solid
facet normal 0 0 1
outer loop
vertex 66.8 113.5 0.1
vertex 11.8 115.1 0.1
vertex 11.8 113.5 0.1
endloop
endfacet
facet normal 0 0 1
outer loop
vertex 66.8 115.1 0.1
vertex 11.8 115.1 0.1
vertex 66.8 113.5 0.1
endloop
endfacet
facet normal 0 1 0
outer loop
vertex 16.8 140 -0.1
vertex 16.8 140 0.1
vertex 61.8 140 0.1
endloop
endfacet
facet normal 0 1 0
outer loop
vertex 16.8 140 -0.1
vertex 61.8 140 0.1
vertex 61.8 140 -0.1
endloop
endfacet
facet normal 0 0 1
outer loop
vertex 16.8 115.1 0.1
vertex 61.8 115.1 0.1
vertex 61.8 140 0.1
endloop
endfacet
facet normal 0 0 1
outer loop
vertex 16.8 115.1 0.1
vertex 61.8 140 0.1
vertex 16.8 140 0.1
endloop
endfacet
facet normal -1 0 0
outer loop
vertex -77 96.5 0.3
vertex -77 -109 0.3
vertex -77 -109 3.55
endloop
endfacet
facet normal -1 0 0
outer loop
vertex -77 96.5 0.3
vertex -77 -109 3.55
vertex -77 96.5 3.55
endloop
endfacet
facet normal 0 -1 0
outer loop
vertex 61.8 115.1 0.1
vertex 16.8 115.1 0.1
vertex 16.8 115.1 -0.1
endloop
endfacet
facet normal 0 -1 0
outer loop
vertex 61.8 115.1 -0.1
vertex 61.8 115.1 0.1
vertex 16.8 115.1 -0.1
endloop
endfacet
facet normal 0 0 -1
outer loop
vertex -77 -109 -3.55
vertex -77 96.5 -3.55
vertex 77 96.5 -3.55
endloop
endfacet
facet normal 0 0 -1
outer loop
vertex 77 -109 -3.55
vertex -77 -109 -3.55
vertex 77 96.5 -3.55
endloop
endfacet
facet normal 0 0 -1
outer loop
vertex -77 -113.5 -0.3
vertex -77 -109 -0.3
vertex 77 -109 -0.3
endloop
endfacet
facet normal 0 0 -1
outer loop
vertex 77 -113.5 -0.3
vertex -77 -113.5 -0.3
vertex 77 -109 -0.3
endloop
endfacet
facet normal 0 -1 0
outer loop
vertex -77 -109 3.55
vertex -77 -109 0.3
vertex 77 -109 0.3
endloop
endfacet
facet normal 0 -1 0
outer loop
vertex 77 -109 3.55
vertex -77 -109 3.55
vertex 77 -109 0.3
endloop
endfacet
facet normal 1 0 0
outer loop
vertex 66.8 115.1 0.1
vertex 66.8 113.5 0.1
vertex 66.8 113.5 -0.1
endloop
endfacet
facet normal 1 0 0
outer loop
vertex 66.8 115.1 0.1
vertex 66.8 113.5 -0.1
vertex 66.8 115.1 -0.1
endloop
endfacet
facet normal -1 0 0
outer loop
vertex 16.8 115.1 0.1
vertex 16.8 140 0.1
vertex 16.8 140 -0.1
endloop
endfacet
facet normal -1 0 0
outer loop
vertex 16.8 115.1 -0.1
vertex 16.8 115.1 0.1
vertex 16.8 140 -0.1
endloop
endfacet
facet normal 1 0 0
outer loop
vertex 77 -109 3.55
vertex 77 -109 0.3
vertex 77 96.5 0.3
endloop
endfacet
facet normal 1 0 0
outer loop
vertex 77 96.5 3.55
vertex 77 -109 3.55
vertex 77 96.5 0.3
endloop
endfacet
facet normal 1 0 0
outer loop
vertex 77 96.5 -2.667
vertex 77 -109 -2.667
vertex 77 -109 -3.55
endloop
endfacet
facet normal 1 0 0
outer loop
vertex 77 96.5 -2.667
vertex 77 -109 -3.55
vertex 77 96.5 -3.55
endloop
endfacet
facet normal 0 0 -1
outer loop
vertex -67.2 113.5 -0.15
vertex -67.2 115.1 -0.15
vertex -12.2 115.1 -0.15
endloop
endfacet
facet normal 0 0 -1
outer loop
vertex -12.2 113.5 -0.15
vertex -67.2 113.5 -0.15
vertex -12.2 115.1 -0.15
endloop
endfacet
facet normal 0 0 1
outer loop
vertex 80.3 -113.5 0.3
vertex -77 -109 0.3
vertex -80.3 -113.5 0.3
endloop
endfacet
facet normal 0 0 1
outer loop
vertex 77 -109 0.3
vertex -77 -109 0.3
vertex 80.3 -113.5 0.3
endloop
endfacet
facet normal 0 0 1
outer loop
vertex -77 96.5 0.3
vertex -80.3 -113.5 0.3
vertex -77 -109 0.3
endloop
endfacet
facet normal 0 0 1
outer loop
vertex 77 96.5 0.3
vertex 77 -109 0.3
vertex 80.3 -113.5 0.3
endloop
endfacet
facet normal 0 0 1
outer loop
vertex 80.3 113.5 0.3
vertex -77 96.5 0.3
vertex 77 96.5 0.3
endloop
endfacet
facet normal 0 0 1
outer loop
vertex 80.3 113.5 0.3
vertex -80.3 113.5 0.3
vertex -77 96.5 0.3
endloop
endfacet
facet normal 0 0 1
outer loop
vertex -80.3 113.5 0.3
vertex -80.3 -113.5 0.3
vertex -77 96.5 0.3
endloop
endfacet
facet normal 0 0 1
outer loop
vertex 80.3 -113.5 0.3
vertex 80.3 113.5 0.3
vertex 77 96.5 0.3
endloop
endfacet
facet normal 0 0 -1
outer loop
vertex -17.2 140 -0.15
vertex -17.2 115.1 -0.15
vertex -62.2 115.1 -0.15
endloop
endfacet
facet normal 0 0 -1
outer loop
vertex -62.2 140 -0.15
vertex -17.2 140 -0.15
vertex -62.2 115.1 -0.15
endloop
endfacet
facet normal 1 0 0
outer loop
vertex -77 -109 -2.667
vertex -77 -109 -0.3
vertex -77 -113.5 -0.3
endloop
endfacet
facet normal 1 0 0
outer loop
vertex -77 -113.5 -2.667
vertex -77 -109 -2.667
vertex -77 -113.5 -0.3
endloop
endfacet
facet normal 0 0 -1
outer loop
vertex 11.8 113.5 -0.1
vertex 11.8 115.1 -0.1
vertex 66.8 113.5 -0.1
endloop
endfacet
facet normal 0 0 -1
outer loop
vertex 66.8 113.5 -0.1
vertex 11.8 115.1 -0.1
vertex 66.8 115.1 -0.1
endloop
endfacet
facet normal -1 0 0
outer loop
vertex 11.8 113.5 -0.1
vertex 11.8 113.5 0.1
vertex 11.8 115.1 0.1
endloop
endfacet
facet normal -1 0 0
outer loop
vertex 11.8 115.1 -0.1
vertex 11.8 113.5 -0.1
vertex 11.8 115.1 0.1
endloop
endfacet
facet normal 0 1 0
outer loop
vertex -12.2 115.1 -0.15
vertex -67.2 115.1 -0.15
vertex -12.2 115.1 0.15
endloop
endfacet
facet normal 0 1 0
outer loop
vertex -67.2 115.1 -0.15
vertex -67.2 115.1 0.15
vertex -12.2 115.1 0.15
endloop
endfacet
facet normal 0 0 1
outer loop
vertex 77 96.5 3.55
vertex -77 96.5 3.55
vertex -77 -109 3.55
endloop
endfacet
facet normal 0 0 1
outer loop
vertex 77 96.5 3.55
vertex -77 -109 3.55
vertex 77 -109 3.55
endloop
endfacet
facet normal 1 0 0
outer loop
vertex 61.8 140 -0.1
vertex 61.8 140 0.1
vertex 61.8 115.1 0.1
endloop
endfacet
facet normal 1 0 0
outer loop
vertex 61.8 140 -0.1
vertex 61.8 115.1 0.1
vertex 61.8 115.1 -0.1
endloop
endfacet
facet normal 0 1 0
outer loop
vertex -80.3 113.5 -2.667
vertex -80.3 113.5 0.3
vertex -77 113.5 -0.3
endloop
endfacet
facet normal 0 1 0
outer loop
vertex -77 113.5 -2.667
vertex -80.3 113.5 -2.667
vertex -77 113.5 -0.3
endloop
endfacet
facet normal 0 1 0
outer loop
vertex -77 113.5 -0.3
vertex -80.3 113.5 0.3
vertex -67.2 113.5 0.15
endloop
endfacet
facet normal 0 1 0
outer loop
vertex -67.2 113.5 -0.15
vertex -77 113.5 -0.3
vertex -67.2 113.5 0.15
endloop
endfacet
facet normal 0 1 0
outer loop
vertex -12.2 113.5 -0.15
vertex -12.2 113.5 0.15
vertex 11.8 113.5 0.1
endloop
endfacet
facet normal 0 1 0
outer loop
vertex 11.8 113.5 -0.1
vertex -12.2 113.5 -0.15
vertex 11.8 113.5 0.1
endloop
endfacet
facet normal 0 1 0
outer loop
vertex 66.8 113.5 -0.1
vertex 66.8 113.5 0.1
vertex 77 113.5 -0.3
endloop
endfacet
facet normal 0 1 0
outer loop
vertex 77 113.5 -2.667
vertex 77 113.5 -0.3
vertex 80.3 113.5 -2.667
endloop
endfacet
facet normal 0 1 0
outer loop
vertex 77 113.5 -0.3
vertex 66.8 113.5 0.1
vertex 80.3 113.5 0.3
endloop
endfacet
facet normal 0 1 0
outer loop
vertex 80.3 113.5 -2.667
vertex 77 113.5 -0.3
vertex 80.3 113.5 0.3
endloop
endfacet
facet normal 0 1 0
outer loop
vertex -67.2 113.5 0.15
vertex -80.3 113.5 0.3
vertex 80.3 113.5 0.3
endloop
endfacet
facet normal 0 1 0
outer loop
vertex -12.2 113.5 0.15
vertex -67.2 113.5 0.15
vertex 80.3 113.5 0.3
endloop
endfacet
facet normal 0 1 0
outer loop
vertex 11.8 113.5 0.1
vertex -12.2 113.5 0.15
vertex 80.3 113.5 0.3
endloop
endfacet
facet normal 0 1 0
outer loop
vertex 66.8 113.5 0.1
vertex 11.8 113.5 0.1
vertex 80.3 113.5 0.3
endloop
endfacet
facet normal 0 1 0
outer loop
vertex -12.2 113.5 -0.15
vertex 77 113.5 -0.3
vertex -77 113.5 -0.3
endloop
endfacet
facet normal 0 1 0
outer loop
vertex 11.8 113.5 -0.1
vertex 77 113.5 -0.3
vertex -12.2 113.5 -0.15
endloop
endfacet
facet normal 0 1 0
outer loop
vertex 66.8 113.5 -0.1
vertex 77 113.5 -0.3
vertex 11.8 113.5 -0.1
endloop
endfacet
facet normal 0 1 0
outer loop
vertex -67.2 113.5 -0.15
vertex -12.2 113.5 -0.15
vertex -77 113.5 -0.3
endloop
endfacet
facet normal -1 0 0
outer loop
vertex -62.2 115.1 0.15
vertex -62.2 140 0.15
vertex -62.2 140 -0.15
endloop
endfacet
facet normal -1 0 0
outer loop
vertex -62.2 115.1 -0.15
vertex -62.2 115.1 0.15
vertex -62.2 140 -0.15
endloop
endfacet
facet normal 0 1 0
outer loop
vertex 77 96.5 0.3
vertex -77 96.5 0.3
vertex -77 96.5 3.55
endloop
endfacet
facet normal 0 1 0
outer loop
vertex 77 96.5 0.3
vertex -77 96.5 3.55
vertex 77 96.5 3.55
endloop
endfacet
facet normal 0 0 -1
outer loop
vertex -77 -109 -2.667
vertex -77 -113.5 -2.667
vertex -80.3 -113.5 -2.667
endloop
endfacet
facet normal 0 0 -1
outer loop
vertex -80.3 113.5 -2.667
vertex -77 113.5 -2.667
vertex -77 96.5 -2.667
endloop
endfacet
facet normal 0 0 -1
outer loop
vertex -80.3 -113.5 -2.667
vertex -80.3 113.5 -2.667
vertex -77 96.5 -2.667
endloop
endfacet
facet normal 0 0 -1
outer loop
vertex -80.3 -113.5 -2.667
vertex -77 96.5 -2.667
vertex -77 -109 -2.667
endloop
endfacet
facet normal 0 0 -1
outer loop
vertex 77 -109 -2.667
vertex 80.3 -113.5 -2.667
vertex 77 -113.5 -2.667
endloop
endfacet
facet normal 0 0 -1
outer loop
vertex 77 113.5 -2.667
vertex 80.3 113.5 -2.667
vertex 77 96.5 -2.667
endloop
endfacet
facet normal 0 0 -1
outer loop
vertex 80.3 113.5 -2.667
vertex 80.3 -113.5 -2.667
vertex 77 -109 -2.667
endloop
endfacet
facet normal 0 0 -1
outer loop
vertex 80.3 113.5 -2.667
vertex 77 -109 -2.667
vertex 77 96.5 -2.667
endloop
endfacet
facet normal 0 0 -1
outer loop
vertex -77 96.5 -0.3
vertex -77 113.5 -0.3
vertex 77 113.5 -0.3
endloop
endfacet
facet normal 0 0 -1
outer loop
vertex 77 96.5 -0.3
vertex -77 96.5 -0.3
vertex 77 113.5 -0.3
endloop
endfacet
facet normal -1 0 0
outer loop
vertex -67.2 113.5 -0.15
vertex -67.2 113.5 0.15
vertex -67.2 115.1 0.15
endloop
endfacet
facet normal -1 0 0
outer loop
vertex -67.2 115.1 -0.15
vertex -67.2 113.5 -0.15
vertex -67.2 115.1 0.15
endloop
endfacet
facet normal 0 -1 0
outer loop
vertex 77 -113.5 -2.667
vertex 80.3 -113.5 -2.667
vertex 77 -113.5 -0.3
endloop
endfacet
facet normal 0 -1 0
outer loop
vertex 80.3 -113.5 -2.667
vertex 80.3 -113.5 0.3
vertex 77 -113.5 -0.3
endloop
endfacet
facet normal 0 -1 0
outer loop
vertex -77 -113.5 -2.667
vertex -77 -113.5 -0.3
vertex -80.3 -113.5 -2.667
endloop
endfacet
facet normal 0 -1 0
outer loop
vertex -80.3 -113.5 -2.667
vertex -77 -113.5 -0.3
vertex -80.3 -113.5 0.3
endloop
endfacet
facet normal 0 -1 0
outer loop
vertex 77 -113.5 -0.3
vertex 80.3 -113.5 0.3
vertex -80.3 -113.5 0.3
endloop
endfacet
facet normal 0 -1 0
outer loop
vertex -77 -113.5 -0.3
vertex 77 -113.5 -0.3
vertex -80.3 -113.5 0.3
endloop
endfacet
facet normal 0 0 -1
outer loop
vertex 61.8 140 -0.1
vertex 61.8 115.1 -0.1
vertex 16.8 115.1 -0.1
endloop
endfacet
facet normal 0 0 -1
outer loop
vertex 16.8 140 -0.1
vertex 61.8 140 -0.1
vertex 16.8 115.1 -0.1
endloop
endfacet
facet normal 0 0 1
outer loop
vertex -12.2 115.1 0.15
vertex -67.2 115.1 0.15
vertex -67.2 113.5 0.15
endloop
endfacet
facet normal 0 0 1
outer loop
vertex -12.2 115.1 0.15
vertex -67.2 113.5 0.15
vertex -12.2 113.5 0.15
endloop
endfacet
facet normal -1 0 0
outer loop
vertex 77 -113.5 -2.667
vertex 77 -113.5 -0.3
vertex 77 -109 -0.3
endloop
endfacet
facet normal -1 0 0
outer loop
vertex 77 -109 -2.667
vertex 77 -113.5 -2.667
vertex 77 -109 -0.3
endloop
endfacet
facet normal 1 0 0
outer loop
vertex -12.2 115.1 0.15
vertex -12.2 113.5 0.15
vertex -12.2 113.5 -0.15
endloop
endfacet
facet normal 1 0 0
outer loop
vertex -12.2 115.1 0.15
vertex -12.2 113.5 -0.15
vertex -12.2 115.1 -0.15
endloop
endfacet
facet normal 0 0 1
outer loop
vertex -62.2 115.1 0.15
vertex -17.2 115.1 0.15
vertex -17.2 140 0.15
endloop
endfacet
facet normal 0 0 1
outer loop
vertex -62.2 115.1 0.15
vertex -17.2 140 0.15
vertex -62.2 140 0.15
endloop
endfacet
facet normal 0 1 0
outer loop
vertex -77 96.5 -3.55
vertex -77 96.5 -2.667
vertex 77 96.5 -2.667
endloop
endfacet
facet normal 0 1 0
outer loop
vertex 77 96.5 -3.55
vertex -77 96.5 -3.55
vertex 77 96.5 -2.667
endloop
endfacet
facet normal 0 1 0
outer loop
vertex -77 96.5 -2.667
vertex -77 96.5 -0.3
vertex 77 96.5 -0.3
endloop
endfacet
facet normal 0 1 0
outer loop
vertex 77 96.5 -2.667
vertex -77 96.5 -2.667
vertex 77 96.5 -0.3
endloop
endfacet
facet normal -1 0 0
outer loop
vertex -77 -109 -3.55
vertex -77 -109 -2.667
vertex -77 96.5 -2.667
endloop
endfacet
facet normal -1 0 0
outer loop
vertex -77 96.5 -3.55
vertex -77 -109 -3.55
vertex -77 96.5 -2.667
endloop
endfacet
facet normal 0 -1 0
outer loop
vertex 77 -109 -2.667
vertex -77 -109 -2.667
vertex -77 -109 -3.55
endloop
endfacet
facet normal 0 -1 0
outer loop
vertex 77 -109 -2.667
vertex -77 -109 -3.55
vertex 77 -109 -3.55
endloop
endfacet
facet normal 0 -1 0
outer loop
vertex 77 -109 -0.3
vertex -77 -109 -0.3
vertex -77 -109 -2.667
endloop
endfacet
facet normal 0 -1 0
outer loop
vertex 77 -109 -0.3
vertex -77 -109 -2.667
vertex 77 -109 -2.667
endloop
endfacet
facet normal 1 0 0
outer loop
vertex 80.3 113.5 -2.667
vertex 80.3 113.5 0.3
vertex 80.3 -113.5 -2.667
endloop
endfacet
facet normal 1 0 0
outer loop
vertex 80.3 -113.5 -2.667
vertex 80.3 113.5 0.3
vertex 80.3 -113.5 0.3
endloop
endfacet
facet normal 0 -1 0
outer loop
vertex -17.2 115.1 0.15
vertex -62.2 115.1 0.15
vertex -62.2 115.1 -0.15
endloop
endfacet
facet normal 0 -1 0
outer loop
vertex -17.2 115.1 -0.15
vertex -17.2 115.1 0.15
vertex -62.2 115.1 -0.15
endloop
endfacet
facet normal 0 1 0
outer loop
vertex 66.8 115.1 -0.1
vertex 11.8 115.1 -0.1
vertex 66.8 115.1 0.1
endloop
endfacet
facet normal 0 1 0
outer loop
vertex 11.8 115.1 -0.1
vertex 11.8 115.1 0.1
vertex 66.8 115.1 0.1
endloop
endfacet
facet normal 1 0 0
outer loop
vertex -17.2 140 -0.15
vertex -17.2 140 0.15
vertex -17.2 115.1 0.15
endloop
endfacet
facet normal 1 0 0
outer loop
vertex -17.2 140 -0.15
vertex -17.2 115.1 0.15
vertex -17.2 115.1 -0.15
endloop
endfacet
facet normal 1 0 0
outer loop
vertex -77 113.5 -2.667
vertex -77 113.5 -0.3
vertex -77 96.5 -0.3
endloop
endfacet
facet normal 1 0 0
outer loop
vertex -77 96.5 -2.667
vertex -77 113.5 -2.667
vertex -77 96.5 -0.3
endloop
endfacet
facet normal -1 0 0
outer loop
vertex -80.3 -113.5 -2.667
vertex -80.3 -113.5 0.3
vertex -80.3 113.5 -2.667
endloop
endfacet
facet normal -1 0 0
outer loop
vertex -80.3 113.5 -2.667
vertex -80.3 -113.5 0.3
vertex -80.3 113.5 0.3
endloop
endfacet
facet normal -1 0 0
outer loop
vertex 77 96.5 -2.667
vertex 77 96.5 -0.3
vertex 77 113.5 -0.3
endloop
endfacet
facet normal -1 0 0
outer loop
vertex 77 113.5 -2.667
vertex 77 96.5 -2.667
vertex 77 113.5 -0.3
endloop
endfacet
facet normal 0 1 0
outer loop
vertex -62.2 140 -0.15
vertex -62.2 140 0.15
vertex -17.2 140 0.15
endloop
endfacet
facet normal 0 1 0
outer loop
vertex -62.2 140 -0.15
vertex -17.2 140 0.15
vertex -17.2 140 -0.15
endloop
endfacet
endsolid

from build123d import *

# Parameters (mm, degrees)
SKETCH1_W                    = 160.6
SKETCH1_H                    = 227
INSULATION_DEPTH             = 0.3
INSULATION_DEPTH_BACK        = 0.3
SKETCH2_W                    = 154
SKETCH2_H                    = 205.5
MAIN_BODY_DEPTH              = 3.55
MAIN_BODY_DEPTH_BACK         = 3.55
SIDE_FOLDS_DEPTH             = 2.366666667
SKETCH6_W                    = 55
SKETCH6_H                    = 18.6
NEGATIVE_TAB_BASE_DEPTH      = 0.1
NEGATIVE_TAB_BASE_DEPTH_BACK = 0.1
SKETCH7_W                    = 55
SKETCH7_H                    = 18.6
POSITIVE_TAB_BASE_DEPTH      = 0.15
POSITIVE_TAB_BASE_DEPTH_BACK = 0.15
SKETCH113_W                  = 0.2
SKETCH113_H                  = 45
NEGATIVE_TAB_DEPTH           = 24.9
SKETCH110_W                  = 0.3
SKETCH110_H                  = 45
POSITIVE_TAB_DEPTH           = 24.9


with BuildPart() as part:
    # Sketch1 → Insulation (new, two sides)
    with BuildSketch(Plane.XY) as insulation_sk:
        Rectangle(SKETCH1_W, SKETCH1_H)
    extrude(amount=INSULATION_DEPTH)
    extrude(insulation_sk.sketch, amount=-INSULATION_DEPTH_BACK)

    # Sketch2 → Main Body (add, two sides)
    with BuildSketch(Plane.XY) as main_body_sk:
        with Locations((0, -6.25)):
            Rectangle(SKETCH2_W, SKETCH2_H)
    extrude(amount=MAIN_BODY_DEPTH)
    extrude(main_body_sk.sketch, amount=-MAIN_BODY_DEPTH_BACK)

    # Sketch5 → Side Folds (add)
    with BuildSketch(Plane(origin=(0, 0, -0.3), x_dir=(-1, 0, 0), z_dir=(0, 0, -1))):
        Polygon((-77, -109), (-77, 96.5), (-77, 113.5), (-80.3, 113.5), (-80.3, -113.5), (-77, -113.5), align=None)
        Polygon((77, 113.5), (77, 96.5), (77, -109), (77, -113.5), (80.3, -113.5), (80.3, 113.5), align=None)
    extrude(amount=SIDE_FOLDS_DEPTH)

    # Sketch6 → Negative Tab Base (add, two sides)
    with BuildSketch(Plane.XY) as negative_tab_base_sk:
        with Locations((39.3, 105.8)):
            Rectangle(SKETCH6_W, SKETCH6_H)
    extrude(amount=NEGATIVE_TAB_BASE_DEPTH)
    extrude(negative_tab_base_sk.sketch, amount=-NEGATIVE_TAB_BASE_DEPTH_BACK)

    # Sketch7 → Positive Tab Base (add, two sides)
    with BuildSketch(Plane.XY) as positive_tab_base_sk:
        with Locations((-39.7, 105.8)):
            Rectangle(SKETCH7_W, SKETCH7_H)
    extrude(amount=POSITIVE_TAB_BASE_DEPTH)
    extrude(positive_tab_base_sk.sketch, amount=-POSITIVE_TAB_BASE_DEPTH_BACK)


with BuildPart() as body_2:
    # Sketch113 → Negative Tab (new body)
    with BuildSketch(Plane(origin=(39.3, 115.1, 0), x_dir=(0, 0, -1), z_dir=(0, 1, 0))):
        Rectangle(SKETCH113_W, SKETCH113_H)
    extrude(amount=NEGATIVE_TAB_DEPTH)


with BuildPart() as body_3:
    # Sketch110 → Positive Tab (new body)
    with BuildSketch(Plane(origin=(-39.7, 115.1, 0), x_dir=(0, 0, -1), z_dir=(0, 1, 0))):
        Rectangle(SKETCH110_W, SKETCH110_H)
    extrude(amount=POSITIVE_TAB_DEPTH)


solid = Compound([part.part, body_2.part, body_3.part])
